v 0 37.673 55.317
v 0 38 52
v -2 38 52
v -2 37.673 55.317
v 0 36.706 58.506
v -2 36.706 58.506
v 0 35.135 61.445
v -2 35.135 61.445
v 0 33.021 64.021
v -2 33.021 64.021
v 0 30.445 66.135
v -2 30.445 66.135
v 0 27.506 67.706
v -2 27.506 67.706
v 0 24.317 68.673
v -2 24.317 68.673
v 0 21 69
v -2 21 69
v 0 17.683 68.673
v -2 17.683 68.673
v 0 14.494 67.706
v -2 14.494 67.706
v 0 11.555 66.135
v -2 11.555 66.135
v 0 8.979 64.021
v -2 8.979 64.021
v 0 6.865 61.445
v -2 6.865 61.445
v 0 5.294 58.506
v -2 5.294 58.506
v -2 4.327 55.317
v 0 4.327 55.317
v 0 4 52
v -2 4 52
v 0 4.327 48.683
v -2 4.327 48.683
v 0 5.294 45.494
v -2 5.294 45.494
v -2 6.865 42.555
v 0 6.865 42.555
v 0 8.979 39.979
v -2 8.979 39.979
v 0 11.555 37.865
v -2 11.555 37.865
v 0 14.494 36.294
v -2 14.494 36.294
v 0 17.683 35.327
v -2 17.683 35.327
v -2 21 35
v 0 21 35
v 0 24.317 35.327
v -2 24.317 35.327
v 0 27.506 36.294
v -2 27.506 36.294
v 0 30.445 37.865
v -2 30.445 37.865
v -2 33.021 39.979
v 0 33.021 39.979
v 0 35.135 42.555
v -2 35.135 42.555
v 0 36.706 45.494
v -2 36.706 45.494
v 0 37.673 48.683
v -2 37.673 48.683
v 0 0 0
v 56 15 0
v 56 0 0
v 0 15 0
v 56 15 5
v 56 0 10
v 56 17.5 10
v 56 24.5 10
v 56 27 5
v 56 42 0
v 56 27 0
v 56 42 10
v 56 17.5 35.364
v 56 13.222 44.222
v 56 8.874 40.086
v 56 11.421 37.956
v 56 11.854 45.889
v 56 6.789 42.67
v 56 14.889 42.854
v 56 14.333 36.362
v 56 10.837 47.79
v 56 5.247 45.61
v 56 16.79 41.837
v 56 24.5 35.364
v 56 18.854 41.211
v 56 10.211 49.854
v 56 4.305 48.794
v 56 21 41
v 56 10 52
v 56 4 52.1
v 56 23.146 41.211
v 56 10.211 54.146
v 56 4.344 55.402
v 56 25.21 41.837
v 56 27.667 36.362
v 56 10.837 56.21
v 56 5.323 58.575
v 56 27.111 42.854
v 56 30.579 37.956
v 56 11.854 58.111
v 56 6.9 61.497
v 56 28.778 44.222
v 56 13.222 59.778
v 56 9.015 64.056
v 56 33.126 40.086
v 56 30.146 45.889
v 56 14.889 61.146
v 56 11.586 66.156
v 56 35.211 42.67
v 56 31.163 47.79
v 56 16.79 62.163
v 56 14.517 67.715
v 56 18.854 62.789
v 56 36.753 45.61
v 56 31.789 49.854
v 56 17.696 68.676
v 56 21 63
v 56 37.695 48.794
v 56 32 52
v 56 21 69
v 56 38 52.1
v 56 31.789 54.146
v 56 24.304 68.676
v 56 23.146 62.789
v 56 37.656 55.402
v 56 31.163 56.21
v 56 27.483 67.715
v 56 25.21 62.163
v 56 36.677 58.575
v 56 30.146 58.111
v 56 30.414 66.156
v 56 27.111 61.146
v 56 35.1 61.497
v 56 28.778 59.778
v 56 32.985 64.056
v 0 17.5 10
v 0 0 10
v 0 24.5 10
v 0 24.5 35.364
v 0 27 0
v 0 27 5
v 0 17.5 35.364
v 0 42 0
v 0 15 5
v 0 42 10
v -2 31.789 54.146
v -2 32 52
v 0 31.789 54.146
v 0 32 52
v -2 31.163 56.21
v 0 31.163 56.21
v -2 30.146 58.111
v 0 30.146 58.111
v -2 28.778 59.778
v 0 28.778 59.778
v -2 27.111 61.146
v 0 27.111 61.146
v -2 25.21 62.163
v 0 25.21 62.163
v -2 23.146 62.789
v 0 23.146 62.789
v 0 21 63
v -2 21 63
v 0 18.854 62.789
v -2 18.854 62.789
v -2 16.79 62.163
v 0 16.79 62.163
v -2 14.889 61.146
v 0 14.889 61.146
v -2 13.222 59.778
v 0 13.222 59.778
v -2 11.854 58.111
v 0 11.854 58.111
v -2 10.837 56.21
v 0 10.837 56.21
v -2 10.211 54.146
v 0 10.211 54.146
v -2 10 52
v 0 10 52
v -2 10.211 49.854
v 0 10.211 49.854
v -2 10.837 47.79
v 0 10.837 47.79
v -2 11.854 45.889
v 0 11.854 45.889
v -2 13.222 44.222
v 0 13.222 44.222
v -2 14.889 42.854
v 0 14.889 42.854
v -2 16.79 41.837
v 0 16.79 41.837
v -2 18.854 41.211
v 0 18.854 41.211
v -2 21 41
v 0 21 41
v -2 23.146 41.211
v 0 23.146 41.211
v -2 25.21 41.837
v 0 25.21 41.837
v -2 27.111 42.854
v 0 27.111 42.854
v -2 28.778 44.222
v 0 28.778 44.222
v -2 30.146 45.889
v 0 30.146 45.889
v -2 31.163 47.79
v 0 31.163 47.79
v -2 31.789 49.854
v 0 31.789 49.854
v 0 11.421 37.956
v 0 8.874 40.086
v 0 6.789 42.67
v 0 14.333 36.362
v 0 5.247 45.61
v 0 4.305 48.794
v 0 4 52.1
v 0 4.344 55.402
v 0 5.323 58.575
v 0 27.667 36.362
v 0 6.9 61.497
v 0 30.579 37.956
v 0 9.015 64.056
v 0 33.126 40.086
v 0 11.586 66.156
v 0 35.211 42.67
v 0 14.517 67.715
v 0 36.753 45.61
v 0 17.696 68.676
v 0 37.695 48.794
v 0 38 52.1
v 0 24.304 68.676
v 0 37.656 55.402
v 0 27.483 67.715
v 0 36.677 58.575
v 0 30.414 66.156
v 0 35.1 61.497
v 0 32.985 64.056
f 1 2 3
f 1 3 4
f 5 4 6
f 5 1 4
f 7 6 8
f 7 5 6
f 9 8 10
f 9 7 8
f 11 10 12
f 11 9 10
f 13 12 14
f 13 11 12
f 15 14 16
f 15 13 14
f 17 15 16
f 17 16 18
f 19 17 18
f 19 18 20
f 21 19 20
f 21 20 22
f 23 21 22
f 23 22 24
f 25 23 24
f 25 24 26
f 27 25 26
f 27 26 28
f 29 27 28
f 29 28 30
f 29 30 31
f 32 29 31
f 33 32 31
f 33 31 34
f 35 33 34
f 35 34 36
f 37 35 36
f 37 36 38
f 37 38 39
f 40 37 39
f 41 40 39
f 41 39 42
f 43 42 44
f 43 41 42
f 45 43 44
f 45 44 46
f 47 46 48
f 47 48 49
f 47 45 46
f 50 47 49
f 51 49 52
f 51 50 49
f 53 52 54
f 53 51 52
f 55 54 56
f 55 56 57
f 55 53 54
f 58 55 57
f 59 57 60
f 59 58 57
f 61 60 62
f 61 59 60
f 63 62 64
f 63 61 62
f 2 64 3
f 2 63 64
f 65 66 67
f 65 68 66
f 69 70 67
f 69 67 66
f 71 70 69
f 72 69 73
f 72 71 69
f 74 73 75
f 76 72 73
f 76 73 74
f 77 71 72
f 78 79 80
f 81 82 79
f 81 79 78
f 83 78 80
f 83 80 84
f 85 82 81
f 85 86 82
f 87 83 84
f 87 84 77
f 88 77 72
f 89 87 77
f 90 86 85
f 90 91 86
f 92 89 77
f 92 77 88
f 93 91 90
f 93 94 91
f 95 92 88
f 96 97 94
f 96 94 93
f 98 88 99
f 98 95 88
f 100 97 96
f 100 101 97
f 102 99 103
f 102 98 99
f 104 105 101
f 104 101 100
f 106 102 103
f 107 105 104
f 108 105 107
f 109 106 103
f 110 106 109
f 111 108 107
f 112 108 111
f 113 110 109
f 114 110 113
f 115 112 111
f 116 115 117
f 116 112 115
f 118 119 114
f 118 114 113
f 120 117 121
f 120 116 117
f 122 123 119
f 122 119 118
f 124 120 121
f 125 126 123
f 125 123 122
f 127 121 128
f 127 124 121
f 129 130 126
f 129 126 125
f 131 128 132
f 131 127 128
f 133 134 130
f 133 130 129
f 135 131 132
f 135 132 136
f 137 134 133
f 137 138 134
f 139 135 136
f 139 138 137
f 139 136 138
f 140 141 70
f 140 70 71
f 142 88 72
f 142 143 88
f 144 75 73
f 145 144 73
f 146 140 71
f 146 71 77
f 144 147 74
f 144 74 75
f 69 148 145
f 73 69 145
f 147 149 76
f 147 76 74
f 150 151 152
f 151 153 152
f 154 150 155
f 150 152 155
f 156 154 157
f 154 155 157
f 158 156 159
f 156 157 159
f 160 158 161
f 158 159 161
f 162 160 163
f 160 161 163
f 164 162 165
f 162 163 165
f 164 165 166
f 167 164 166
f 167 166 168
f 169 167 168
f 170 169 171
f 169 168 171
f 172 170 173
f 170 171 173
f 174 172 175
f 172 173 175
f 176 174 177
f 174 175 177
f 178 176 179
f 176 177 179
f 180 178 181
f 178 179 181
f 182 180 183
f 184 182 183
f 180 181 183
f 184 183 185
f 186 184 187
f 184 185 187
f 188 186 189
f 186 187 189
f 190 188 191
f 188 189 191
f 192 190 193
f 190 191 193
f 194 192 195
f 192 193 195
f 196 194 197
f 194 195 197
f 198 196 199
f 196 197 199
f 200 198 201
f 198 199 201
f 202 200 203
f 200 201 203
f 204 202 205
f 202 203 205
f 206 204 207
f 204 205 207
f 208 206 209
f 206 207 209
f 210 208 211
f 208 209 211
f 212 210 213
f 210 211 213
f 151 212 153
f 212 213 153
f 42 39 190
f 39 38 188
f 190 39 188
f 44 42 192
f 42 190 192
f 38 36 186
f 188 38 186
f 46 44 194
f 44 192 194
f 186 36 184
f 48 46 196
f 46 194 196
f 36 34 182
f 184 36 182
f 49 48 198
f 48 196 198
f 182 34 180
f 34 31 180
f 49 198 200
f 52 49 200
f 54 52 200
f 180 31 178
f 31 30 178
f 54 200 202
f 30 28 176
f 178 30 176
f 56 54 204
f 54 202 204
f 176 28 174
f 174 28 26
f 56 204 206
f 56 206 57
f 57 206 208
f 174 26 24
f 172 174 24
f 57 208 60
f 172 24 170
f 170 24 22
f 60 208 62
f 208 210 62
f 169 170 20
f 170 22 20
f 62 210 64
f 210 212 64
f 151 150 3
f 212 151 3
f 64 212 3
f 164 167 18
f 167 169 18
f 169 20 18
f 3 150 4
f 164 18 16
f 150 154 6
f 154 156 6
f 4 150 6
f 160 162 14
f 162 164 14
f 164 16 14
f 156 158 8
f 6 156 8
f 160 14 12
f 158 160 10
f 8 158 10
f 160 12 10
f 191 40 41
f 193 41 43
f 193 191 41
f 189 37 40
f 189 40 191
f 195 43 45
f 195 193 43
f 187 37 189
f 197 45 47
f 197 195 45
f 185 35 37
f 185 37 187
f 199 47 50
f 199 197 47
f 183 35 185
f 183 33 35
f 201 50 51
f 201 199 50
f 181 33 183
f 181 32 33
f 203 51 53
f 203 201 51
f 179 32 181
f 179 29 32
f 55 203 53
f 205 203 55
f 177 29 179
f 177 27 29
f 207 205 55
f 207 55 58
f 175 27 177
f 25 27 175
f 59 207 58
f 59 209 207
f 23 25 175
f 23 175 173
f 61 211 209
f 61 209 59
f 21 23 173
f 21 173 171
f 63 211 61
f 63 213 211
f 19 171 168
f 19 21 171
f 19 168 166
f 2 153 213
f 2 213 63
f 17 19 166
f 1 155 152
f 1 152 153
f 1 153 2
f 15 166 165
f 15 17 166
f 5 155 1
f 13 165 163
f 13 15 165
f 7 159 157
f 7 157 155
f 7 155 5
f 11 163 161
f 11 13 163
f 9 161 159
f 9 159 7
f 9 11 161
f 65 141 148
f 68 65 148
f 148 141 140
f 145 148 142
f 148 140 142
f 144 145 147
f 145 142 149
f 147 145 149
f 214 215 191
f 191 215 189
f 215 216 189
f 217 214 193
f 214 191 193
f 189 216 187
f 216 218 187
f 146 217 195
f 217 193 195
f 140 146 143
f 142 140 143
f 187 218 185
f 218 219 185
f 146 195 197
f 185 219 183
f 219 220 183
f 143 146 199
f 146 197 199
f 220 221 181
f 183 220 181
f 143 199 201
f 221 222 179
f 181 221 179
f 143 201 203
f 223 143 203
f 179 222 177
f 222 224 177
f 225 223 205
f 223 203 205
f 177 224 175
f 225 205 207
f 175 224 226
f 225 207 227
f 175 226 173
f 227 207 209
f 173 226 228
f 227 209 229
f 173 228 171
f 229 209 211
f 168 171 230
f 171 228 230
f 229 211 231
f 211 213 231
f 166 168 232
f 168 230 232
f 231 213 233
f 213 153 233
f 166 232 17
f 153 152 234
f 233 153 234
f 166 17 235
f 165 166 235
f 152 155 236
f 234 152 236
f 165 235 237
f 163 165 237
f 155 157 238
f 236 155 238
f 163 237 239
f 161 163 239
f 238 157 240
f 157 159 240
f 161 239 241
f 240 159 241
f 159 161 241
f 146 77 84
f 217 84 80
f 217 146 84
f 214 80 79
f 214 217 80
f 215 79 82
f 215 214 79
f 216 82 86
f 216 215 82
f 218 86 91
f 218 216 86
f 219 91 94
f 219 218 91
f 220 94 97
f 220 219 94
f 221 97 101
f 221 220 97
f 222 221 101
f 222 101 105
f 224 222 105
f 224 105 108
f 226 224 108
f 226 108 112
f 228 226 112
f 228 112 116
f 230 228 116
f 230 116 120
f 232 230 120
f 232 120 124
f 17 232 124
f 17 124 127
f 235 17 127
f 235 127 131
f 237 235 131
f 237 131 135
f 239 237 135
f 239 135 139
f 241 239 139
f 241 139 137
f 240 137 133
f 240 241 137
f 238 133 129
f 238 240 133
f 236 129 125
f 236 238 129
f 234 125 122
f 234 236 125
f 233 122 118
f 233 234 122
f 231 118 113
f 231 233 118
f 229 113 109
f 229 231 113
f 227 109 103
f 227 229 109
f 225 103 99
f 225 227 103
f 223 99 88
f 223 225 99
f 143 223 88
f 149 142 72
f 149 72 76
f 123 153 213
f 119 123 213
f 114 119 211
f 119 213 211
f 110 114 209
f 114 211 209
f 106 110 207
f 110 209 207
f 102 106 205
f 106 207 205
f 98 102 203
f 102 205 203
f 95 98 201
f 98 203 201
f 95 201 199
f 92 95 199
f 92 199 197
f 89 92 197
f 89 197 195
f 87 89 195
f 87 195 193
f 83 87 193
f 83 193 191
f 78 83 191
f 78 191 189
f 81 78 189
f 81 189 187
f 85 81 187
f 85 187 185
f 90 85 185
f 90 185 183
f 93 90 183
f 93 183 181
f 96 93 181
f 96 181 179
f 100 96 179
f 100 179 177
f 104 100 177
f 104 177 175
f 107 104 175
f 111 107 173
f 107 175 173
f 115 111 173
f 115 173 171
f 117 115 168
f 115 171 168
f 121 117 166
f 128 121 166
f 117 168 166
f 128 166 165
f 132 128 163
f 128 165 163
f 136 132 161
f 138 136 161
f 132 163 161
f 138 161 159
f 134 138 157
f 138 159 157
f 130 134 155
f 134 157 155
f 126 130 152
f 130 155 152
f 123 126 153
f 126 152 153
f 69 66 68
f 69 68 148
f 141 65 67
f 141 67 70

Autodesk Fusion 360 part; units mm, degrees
sketch "Sketch1" plane through (0, 0, 0) normal (1, 0, 0) x (0, 1, 0)
  line L0 (0, 10) -> (42, 10)
  line L1 (42, 10) -> (42, 0)
  line L2 (42, 0) -> (0, 0)
  line L3 (0, 0) -> (0, 10)
  line L4 (0, 5) -> (42, 5)
  line L5 (15, 0) -> (15, 5)
  line L6 (27, 0) -> (27, 5)
  line L7 (17.5, 52) -> (24.5, 52)
  line L8 (24.5, 52) -> (24.5, 10)
  line L9 (24.5, 10) -> (17.5, 10)
  line L10 (17.5, 10) -> (17.5, 52)
  circle A0 centre (21, 52) radius 17
  circle A1 centre (21, 52) radius 11
  dimension "d1" = 42
  dimension "d2" = 10
  dimension "d4" = 12
  dimension "d5" = 15
  dimension "d6" = 15
  dimension "d7" = 42
  dimension "d8" = 7
  dimension "d9" = 17.5
  dimension "d10" = 34
  dimension "d11" = 22
extrude "Extrude1" add sketch "Sketch1" along normal blind 56 contours L0 L1 L3 L4 L9 | L0 L8 L9 L10 A0 | L2 L3 L4 L5 | L8 L10 A0 A1 | L8 L10 A0 A1 | L1 L2 L4 L6 makes body 1
extrude "Extrude2" add sketch "Sketch1" against normal blind 2 separate body contours L8 L10 A0 A1 | L8 L10 A0 A1 makes body 2
equation "d9 = ( 35 / 2 ) * 1 mm"
